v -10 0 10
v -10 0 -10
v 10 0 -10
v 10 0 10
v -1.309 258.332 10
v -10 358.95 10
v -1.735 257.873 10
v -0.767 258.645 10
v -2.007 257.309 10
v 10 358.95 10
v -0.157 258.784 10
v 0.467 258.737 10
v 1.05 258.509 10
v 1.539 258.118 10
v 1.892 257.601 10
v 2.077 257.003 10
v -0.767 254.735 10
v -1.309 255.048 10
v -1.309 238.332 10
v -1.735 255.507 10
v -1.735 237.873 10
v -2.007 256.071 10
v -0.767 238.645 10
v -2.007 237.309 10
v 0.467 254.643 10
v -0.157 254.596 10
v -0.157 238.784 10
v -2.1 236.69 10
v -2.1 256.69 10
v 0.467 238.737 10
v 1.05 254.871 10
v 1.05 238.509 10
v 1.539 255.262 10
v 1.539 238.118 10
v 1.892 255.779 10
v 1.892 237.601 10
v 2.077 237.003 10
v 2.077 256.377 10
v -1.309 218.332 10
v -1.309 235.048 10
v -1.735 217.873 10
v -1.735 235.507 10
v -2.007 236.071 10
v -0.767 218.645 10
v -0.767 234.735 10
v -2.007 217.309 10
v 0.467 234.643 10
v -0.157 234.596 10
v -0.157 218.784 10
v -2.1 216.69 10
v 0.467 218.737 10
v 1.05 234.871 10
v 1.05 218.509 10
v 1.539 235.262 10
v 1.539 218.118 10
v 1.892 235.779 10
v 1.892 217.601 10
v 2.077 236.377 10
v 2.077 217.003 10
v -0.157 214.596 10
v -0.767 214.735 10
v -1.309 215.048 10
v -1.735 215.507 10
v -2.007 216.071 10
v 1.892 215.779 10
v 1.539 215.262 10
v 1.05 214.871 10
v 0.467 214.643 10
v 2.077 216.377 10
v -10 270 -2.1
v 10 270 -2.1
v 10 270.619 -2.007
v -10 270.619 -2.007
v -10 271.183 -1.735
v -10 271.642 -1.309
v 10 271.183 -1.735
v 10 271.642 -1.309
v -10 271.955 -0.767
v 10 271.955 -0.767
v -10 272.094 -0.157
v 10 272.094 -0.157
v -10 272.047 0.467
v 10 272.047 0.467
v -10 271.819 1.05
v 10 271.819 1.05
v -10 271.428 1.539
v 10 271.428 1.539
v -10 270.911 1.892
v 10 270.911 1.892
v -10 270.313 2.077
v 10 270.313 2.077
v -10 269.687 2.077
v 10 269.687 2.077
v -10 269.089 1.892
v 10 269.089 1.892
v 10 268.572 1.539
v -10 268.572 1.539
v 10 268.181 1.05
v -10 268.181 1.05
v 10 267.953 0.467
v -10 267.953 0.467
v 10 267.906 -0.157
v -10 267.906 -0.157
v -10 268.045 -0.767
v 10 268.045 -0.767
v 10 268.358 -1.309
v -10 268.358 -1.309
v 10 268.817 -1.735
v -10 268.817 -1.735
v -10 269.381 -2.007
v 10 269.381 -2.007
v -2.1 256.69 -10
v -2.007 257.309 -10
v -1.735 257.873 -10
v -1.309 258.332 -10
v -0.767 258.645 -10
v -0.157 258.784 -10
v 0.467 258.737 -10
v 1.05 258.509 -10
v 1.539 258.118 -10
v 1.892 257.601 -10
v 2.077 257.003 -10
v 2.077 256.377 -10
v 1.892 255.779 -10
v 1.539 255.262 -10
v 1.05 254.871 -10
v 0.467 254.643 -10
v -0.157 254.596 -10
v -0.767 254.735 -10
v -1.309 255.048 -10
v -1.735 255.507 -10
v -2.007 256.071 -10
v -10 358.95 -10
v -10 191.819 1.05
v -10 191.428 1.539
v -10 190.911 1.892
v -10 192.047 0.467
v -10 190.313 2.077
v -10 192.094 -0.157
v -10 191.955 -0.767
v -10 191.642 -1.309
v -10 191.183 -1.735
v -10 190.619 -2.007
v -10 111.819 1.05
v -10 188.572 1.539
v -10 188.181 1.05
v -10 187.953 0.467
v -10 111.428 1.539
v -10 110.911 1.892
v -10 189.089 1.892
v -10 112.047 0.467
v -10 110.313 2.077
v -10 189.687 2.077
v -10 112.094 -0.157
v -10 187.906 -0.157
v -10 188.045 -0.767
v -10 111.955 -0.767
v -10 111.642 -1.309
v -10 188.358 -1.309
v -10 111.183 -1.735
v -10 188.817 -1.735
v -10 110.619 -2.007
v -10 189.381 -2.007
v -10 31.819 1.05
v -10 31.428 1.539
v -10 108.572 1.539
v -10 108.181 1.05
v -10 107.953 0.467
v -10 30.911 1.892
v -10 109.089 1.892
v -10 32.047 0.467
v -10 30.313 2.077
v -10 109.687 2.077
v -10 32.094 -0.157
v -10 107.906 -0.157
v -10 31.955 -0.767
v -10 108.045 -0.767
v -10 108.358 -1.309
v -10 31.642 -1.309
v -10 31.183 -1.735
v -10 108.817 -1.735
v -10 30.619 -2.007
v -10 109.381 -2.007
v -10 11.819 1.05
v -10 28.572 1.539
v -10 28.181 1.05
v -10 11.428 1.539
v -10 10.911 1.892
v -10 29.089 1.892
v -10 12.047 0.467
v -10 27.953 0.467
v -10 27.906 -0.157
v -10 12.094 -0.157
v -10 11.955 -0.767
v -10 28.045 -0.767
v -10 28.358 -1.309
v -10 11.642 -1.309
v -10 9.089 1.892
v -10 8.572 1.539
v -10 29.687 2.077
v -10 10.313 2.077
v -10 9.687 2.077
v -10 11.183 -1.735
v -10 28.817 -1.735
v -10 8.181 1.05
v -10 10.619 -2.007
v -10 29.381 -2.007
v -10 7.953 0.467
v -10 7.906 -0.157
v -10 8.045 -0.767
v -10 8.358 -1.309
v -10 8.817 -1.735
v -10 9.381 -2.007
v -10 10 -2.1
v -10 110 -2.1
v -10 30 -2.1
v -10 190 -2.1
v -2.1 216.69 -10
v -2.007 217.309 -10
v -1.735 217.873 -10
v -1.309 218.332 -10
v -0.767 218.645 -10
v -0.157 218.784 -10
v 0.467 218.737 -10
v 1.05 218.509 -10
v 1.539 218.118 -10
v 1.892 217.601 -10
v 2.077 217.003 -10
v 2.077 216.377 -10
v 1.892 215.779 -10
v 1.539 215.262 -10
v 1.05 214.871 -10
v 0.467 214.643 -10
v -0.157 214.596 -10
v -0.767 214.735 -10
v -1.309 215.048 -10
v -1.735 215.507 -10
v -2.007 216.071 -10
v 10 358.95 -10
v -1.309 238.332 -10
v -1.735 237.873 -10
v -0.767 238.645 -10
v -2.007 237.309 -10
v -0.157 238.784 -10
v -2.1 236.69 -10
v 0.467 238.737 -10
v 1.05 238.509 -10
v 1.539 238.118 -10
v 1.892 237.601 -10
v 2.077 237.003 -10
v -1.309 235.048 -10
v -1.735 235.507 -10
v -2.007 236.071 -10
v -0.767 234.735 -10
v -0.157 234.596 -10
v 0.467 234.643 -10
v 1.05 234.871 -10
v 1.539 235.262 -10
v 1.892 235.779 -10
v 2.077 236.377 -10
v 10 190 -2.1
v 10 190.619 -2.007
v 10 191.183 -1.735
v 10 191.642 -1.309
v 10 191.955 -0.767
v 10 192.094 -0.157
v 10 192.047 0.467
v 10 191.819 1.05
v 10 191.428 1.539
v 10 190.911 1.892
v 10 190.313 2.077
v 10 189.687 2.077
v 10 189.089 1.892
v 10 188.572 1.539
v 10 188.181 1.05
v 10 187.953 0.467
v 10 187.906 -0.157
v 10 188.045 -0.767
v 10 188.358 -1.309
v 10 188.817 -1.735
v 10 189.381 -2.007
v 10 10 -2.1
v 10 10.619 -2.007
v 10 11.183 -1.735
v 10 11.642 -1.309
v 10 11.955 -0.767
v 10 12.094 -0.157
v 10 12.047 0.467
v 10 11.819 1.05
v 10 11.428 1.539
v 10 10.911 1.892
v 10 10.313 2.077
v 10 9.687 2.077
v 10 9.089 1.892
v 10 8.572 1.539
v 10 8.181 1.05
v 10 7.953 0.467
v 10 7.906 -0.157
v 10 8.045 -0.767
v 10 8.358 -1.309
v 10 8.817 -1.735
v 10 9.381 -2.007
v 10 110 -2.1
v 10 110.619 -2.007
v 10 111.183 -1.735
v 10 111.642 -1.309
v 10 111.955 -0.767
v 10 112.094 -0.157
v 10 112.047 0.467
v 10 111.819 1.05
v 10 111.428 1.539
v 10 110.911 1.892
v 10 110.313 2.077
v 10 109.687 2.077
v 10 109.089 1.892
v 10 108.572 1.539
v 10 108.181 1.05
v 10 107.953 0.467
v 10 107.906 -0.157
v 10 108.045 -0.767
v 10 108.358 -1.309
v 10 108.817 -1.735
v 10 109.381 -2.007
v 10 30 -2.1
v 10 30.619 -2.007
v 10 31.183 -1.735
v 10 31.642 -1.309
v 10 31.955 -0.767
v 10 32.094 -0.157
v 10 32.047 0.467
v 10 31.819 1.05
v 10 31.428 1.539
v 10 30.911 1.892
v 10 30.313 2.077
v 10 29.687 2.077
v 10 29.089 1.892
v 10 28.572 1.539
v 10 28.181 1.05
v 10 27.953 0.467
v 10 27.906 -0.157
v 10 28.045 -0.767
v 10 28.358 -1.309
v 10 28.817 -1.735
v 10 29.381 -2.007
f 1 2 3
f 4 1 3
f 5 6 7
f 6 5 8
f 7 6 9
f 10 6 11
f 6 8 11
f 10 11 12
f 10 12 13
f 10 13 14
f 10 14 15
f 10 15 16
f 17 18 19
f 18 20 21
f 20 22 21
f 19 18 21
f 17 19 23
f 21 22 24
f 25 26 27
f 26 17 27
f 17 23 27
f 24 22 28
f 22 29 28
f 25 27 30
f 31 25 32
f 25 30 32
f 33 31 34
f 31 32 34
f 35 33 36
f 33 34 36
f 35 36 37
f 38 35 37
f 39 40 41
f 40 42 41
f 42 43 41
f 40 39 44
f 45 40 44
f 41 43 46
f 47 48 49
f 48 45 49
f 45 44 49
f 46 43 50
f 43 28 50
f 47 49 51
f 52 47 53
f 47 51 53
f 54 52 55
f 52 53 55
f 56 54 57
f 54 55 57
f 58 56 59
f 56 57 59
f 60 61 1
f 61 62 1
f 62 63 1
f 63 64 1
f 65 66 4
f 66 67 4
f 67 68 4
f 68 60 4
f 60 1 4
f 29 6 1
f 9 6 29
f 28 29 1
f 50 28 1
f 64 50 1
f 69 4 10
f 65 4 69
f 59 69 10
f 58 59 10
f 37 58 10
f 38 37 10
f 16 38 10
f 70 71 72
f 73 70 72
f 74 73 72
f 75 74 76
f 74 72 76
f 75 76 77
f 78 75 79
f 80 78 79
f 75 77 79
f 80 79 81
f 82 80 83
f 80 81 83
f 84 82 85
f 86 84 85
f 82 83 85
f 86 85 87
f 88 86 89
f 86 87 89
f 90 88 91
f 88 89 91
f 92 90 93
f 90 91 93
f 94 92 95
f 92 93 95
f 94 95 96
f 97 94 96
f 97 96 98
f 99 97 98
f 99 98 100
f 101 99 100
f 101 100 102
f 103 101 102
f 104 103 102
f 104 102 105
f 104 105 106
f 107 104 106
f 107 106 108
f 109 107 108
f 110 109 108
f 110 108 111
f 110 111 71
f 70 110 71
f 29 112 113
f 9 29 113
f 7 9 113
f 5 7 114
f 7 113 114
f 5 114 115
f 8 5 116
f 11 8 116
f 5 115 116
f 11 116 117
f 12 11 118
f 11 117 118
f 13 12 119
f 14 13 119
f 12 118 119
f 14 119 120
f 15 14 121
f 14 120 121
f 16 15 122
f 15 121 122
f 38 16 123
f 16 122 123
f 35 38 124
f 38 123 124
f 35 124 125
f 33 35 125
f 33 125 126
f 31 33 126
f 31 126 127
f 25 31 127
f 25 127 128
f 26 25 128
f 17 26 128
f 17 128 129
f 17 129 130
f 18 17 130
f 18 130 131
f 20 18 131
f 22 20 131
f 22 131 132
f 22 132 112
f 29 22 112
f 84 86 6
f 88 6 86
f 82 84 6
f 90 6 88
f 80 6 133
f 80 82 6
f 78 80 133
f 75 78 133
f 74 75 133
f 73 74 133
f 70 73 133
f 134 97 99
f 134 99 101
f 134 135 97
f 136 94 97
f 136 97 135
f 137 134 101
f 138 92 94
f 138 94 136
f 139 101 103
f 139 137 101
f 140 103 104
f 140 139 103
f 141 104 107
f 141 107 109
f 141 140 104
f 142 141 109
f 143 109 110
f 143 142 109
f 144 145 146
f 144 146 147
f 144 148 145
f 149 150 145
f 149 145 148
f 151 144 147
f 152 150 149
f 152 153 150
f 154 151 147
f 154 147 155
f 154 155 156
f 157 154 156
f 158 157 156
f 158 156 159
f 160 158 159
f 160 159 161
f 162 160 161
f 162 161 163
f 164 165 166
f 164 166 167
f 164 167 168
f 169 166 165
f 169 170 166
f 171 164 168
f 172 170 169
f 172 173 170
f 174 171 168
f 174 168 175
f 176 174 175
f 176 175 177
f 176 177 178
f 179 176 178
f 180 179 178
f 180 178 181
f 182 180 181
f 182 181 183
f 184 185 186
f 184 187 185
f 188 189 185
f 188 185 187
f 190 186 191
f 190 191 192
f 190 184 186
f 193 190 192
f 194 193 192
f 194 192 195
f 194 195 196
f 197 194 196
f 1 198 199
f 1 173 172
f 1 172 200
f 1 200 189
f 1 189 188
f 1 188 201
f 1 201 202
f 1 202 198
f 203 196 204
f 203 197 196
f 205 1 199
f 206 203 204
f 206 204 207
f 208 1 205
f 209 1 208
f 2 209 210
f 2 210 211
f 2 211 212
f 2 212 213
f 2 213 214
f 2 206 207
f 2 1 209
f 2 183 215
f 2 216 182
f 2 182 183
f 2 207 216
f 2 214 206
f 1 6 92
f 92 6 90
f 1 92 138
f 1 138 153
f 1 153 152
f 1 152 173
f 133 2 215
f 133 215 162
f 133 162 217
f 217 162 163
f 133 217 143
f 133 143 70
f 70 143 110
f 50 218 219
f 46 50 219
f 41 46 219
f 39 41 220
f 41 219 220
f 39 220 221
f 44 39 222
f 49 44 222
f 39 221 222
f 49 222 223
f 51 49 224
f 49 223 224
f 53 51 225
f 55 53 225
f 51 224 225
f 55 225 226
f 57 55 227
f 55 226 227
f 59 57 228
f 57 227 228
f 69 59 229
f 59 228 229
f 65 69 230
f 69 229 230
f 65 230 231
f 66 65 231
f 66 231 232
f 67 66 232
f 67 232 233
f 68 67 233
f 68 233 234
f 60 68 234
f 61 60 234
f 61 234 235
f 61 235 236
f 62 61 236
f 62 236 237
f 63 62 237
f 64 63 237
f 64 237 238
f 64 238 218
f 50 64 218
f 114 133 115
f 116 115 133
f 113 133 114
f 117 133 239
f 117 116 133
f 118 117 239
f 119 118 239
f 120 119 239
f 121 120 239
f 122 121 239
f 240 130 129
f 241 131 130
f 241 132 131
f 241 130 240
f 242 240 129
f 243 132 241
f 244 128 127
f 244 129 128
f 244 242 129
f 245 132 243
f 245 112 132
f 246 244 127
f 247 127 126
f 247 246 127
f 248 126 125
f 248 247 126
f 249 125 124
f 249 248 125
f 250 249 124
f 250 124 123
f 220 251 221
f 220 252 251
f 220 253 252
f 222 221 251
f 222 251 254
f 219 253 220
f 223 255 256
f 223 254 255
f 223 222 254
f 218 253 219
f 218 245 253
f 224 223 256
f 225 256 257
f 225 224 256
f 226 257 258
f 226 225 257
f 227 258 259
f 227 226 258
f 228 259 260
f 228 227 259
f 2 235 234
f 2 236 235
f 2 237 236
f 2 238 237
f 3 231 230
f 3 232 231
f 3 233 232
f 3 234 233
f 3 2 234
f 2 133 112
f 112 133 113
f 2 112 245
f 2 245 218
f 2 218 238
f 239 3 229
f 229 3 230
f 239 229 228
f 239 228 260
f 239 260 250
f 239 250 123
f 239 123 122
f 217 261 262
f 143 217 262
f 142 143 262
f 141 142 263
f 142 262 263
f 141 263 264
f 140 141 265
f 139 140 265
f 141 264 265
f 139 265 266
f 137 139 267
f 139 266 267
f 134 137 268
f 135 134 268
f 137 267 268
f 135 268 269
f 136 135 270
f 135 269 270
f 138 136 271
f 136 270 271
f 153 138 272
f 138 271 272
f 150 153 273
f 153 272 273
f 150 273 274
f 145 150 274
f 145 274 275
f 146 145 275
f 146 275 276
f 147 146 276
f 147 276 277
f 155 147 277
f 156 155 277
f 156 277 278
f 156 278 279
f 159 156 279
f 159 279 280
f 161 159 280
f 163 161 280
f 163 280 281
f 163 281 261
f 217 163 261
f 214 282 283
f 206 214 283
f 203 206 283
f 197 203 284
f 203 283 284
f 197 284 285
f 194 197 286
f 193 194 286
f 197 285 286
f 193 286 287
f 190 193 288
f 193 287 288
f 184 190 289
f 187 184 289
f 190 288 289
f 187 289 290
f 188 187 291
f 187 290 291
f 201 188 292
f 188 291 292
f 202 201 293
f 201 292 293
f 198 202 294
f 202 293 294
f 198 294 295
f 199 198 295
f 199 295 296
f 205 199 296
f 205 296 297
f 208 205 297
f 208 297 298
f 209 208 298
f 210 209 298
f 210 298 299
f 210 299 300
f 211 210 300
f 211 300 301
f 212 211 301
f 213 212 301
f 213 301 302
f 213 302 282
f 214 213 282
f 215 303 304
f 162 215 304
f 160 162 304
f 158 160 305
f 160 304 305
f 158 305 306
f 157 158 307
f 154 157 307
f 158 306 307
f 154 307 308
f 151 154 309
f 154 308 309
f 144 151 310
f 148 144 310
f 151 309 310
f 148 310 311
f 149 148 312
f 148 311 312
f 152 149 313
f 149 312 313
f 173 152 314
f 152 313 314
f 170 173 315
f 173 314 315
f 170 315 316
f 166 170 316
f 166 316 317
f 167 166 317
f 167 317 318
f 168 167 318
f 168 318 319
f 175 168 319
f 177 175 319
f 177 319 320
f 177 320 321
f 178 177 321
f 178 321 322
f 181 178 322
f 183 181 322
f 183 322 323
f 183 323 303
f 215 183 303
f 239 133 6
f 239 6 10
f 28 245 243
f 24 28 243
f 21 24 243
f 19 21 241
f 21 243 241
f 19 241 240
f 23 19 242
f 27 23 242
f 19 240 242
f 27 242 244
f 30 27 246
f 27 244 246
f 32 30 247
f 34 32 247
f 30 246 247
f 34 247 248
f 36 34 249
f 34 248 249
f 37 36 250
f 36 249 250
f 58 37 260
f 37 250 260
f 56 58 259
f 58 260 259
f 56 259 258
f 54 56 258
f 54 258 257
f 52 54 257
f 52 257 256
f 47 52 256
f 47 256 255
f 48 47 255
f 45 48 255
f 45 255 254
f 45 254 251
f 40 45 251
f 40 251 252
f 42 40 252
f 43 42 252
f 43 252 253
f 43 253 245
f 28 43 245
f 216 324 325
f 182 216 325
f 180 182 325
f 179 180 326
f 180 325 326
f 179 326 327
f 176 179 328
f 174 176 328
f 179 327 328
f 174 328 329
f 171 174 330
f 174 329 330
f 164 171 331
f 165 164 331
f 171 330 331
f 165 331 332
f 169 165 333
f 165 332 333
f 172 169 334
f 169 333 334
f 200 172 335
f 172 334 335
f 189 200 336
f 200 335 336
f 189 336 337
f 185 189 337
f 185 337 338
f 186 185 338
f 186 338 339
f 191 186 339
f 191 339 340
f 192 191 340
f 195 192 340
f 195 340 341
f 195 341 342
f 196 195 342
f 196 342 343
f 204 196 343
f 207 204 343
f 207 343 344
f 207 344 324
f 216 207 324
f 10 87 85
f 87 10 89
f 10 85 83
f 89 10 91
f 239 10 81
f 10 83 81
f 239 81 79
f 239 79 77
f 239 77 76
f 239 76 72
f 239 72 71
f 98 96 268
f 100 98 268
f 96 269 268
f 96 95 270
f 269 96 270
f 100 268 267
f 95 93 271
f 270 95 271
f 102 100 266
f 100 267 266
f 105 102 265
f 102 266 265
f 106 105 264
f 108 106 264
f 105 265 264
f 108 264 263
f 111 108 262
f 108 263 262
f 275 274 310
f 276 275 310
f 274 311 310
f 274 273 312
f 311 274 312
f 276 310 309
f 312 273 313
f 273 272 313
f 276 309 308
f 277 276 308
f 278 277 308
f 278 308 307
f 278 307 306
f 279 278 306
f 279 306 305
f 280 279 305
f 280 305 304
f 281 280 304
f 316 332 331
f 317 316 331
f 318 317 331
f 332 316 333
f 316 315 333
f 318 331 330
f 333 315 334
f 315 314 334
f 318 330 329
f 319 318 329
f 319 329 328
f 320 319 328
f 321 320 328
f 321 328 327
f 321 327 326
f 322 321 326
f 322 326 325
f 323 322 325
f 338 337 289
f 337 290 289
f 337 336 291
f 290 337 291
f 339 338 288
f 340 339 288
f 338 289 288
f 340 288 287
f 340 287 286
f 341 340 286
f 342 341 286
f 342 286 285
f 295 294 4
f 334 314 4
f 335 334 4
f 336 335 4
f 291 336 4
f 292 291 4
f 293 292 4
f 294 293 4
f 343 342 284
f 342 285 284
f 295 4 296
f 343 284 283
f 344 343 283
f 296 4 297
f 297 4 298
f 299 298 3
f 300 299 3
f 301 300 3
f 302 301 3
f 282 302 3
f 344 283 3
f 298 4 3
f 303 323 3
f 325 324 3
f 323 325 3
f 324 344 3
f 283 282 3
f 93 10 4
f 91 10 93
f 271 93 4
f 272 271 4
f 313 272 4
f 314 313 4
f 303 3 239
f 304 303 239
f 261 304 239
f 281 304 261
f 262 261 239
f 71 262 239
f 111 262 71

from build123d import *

# Parameters (mm, degrees)
SKETCH_1_W          = 20
SKETCH_1_H          = 20
EXTRUDE_1_DEPTH     = 358.95
SKETCH_2_R          = 2.1
CUT_EXTRUDE_1_DEPTH = 360.645801449
SKETCH_3_R          = 2.1
CUT_EXTRUDE_2_DEPTH = 360.645801449


with BuildPart() as part:
    # 草图1 → 凸台-拉伸1 (new body)
    with BuildSketch(Plane(origin=(0, 0, 0), x_dir=(1, 0, 0), z_dir=(0, 1, 0))):
        Rectangle(SKETCH_1_W, SKETCH_1_H)
    extrude(amount=EXTRUDE_1_DEPTH)

    # 草图2 → 切除-拉伸1 (cut, through all)
    with BuildSketch(Plane(origin=(10, 0, 0), x_dir=(0, 0, -1), z_dir=(1, 0, 0))):
        with Locations((0, 10)):
            Circle(SKETCH_2_R)
        with Locations((0, 30)):
            Circle(SKETCH_2_R)
        with Locations((0, 110)):
            Circle(SKETCH_2_R)
        with Locations((0, 190)):
            Circle(SKETCH_2_R)
        with Locations((0, 270)):
            Circle(SKETCH_2_R)
    extrude(amount=-CUT_EXTRUDE_1_DEPTH, mode=Mode.SUBTRACT)

    # 草图3 → 切除-拉伸2 (cut, through all)
    with BuildSketch(Plane(origin=(0, 0, -10), x_dir=(-1, 0, 0), z_dir=(0, 0, -1))):
        with Locations((0, 216.69)):
            Circle(SKETCH_3_R)
        with Locations((0, 236.69)):
            Circle(SKETCH_3_R)
        with Locations((0, 256.69)):
            Circle(SKETCH_3_R)
    extrude(amount=-CUT_EXTRUDE_2_DEPTH, mode=Mode.SUBTRACT)


solid = part.part
